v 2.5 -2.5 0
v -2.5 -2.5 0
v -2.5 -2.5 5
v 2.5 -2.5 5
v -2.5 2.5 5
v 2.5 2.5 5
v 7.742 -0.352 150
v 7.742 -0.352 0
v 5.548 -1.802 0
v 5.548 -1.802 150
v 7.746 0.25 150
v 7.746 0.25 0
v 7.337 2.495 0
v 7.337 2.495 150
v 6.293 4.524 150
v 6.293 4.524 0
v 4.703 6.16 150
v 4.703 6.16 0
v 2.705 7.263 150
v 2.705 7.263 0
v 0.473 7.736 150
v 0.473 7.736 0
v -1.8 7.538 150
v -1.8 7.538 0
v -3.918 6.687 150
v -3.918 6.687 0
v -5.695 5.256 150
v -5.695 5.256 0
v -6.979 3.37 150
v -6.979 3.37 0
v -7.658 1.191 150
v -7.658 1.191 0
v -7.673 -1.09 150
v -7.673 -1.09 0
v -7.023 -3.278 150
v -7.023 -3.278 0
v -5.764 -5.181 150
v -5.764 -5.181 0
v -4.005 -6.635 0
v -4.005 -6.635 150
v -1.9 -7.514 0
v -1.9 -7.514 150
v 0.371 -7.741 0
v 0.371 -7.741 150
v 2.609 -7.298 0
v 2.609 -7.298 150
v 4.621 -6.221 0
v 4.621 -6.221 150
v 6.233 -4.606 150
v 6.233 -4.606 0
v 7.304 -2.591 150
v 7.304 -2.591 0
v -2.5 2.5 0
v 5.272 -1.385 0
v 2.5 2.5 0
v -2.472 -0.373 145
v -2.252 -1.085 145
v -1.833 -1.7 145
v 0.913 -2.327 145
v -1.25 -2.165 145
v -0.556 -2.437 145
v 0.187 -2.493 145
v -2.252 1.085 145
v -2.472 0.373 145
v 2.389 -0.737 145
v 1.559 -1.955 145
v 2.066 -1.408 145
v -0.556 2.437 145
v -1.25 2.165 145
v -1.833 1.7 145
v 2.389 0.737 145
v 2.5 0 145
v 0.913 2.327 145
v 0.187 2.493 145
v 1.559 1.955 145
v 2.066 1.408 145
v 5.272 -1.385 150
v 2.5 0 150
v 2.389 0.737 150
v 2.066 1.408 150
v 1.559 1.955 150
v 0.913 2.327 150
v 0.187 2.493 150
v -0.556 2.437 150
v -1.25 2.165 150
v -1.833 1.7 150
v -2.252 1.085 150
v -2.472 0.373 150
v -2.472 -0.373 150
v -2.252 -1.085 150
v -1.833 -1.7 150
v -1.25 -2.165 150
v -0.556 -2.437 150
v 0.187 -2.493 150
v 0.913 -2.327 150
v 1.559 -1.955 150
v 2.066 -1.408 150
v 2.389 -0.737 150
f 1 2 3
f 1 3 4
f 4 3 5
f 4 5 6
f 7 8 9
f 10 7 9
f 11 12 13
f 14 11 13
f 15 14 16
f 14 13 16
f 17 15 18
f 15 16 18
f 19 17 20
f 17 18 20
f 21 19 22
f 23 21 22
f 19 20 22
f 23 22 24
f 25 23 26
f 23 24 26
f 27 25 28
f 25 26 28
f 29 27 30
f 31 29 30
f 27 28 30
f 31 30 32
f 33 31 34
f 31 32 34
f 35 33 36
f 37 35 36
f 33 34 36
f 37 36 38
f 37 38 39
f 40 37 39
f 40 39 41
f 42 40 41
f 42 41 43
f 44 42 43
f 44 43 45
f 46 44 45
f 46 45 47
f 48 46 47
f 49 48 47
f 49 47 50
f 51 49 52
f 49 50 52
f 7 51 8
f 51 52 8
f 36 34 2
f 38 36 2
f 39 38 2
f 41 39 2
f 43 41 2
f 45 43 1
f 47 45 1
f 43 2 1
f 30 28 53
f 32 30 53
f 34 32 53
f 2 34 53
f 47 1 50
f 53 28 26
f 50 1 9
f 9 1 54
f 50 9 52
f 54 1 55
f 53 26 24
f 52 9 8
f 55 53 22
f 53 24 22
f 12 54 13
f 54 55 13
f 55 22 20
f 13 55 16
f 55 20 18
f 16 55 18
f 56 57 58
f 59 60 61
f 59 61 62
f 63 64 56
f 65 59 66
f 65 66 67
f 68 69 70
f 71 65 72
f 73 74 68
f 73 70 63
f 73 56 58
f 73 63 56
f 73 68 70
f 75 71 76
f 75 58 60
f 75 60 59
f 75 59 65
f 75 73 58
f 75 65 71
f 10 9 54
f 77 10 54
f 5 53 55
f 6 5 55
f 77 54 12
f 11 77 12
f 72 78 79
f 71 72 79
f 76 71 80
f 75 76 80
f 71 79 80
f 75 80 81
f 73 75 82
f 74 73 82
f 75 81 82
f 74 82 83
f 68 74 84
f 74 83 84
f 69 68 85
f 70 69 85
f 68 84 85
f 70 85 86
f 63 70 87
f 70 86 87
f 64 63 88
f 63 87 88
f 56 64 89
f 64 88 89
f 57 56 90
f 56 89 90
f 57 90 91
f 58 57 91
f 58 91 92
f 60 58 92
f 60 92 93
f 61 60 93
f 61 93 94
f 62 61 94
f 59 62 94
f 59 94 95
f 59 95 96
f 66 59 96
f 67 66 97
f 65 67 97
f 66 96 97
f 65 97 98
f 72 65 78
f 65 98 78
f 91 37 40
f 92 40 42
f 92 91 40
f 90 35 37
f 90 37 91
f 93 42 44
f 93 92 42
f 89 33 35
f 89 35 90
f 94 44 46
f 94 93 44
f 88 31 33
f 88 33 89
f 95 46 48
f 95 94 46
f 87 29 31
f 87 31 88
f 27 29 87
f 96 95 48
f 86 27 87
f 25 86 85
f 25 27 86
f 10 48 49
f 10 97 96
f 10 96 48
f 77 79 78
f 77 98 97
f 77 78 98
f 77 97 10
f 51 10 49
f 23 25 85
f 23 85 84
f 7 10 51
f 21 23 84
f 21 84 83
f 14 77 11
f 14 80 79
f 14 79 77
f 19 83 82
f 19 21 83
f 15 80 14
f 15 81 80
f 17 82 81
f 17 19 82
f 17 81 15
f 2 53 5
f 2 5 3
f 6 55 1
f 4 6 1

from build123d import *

# Parameters (mm, degrees)
F1_DEPTH = 150
F2_R     = 2.5
F3_DEPTH = 5
F4_W     = 5
F4_H     = 5
F5_DEPTH = 5


with BuildPart() as f1:
    # F0 (on Top) → F1 (new body)
    with BuildSketch(Plane.XY):
        with BuildLine():
            Line((5.272375, -1.385031), (7.745967, 0.25))
            ThreePointArc((7.745967, 0.25), (-7.749832, 0.051027), (7.742003, -0.351977))
            Line((7.742003, -0.351977), (5.548085, -1.802145))
            Line((5.548085, -1.802145), (5.272375, -1.385031))
        make_face()
    extrude(amount=F1_DEPTH)

    # F2 (on face) → F3 (cut)
    with BuildSketch(Plane.XY.offset(150)):
        Circle(F2_R)
    extrude(amount=-F3_DEPTH, mode=Mode.SUBTRACT)

    # F4 (on face) → F5 (cut)
    with BuildSketch(Plane(origin=(0, 0, 0), x_dir=(1, 0, 0), z_dir=(0, 0, -1))):
        Rectangle(F4_W, F4_H)
    extrude(amount=-F5_DEPTH, mode=Mode.SUBTRACT)


solid = f1.part
